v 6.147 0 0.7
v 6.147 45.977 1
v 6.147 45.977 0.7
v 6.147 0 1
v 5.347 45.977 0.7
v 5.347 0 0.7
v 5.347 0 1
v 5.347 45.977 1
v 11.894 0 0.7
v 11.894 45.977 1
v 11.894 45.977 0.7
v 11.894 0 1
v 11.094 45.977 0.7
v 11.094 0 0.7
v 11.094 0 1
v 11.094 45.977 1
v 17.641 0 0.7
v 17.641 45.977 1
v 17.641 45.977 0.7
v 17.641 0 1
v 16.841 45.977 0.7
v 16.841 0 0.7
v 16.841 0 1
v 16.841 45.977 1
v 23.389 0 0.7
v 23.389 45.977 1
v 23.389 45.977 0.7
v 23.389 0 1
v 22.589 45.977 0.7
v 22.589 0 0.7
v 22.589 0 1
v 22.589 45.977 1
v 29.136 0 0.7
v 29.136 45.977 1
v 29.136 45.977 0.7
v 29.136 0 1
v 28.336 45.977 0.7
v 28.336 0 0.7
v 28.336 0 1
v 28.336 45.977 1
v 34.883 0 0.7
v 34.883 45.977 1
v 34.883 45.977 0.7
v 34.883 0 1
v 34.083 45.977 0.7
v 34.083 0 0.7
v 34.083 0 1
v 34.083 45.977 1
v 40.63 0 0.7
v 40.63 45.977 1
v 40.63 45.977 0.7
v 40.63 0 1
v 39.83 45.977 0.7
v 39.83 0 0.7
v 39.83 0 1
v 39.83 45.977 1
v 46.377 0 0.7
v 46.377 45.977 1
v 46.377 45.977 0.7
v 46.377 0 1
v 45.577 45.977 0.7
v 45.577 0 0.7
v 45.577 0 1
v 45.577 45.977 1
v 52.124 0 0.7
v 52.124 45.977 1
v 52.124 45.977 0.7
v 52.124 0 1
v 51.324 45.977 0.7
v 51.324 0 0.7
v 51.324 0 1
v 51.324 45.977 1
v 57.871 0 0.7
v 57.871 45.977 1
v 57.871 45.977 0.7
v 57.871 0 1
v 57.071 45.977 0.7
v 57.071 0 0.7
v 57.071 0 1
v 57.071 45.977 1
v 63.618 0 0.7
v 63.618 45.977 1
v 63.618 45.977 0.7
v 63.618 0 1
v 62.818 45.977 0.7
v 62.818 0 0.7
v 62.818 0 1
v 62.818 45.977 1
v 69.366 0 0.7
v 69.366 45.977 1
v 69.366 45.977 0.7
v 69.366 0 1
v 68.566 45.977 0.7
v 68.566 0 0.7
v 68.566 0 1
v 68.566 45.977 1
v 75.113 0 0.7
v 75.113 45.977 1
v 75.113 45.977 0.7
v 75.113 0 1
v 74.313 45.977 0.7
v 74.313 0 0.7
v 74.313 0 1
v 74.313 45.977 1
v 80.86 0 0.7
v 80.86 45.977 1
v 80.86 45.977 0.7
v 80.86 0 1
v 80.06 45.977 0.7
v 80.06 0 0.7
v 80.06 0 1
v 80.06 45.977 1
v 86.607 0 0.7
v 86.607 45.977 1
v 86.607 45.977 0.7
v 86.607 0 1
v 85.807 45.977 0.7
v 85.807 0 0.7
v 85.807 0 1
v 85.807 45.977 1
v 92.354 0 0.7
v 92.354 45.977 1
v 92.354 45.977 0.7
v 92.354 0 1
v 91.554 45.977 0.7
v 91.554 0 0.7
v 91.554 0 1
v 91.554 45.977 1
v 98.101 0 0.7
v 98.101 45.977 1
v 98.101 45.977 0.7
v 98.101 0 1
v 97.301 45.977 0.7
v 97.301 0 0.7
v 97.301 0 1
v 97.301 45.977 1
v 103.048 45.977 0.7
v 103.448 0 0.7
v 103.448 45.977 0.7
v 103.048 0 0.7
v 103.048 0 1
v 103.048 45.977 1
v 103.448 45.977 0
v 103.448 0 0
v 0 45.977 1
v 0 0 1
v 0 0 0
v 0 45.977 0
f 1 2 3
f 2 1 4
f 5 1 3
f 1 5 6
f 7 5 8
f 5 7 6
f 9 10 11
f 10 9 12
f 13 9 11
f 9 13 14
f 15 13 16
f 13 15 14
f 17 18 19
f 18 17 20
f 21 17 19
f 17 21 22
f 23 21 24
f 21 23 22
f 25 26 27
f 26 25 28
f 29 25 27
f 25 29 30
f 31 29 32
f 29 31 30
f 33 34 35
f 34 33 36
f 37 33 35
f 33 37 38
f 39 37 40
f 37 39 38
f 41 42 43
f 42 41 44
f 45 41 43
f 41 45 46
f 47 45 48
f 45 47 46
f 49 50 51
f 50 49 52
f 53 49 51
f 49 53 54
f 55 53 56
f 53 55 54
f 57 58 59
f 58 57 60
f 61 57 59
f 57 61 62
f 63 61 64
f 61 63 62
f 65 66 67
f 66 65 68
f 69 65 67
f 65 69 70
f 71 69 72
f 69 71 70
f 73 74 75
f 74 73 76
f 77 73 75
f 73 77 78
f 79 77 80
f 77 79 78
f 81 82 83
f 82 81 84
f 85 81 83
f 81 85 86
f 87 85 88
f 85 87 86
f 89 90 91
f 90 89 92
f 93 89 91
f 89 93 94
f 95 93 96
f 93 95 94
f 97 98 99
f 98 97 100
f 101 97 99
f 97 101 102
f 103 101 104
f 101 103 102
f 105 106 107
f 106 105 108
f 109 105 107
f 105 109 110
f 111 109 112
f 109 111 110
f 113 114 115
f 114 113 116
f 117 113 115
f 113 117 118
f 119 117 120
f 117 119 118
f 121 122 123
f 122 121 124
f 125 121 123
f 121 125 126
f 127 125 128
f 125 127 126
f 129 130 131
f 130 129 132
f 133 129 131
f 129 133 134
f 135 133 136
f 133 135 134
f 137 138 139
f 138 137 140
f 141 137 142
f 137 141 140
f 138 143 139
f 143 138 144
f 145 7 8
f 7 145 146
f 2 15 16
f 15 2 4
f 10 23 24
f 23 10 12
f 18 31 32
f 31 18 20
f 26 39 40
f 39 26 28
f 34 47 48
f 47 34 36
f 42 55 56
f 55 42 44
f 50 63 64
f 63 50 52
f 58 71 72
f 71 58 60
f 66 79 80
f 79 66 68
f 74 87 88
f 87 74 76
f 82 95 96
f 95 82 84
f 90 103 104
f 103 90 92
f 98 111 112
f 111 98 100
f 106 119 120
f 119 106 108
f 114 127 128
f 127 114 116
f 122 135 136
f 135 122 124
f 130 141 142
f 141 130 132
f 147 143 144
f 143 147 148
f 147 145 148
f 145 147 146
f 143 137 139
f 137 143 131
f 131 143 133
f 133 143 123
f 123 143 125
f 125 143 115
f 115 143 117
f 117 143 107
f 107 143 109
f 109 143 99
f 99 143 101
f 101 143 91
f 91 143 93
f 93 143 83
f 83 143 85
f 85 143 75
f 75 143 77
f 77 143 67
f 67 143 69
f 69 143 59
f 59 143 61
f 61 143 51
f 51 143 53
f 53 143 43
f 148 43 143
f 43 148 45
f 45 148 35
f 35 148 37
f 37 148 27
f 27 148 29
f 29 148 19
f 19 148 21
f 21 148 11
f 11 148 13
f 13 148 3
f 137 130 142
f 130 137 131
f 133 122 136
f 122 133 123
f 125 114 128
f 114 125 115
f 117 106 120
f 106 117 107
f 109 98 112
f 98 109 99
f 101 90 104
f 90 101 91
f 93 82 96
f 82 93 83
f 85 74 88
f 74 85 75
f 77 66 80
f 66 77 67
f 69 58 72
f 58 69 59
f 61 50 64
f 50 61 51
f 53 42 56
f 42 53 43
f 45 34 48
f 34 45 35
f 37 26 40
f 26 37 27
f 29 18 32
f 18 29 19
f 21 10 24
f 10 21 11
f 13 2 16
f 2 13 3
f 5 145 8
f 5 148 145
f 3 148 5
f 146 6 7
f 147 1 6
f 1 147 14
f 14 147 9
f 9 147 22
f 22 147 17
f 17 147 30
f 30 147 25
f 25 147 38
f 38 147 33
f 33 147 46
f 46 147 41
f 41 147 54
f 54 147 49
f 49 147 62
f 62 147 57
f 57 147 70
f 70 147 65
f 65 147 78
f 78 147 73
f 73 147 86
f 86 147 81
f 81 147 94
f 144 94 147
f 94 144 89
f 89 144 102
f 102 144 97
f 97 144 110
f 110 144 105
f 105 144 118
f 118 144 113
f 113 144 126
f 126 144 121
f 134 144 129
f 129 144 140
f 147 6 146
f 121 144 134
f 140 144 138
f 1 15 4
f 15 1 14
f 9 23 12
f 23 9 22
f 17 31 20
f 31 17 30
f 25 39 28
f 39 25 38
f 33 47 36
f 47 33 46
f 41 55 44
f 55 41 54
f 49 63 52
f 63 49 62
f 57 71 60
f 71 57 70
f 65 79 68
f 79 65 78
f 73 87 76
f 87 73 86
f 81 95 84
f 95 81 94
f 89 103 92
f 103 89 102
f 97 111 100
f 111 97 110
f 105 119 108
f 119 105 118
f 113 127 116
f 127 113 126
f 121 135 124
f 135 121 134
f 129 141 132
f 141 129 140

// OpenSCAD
/*
 * PROMPT: Left side wall panel of the Cities-Skylines-style police station garage
 * annex in H0 scale (1:87). Plain facade with vertical siding grooves on exterior
 * face. Flat 1 mm panel, exterior face up.
 */

$fn = 32;
S = 1/87;
panel_t = 1.0;

annex_d_real  = 9000;
annex_h_real  = 4000;
siding_p_real = 500;
siding_w      = 0.8;
siding_d      = 0.3;

annex_d  = annex_d_real * S;
annex_h  = annex_h_real * S;
siding_p = siding_p_real * S;

module garage_wall_left() {
    difference() {
        cube([annex_d, annex_h, panel_t]);

        // vertical siding grooves on exterior face
        for (i = [1 : floor(annex_d / siding_p)]) {
            gx = i * siding_p - siding_w/2;
            translate([gx, -1, panel_t - siding_d])
                cube([siding_w, annex_h+2, siding_d+1]);
        }
    }
}

garage_wall_left();
